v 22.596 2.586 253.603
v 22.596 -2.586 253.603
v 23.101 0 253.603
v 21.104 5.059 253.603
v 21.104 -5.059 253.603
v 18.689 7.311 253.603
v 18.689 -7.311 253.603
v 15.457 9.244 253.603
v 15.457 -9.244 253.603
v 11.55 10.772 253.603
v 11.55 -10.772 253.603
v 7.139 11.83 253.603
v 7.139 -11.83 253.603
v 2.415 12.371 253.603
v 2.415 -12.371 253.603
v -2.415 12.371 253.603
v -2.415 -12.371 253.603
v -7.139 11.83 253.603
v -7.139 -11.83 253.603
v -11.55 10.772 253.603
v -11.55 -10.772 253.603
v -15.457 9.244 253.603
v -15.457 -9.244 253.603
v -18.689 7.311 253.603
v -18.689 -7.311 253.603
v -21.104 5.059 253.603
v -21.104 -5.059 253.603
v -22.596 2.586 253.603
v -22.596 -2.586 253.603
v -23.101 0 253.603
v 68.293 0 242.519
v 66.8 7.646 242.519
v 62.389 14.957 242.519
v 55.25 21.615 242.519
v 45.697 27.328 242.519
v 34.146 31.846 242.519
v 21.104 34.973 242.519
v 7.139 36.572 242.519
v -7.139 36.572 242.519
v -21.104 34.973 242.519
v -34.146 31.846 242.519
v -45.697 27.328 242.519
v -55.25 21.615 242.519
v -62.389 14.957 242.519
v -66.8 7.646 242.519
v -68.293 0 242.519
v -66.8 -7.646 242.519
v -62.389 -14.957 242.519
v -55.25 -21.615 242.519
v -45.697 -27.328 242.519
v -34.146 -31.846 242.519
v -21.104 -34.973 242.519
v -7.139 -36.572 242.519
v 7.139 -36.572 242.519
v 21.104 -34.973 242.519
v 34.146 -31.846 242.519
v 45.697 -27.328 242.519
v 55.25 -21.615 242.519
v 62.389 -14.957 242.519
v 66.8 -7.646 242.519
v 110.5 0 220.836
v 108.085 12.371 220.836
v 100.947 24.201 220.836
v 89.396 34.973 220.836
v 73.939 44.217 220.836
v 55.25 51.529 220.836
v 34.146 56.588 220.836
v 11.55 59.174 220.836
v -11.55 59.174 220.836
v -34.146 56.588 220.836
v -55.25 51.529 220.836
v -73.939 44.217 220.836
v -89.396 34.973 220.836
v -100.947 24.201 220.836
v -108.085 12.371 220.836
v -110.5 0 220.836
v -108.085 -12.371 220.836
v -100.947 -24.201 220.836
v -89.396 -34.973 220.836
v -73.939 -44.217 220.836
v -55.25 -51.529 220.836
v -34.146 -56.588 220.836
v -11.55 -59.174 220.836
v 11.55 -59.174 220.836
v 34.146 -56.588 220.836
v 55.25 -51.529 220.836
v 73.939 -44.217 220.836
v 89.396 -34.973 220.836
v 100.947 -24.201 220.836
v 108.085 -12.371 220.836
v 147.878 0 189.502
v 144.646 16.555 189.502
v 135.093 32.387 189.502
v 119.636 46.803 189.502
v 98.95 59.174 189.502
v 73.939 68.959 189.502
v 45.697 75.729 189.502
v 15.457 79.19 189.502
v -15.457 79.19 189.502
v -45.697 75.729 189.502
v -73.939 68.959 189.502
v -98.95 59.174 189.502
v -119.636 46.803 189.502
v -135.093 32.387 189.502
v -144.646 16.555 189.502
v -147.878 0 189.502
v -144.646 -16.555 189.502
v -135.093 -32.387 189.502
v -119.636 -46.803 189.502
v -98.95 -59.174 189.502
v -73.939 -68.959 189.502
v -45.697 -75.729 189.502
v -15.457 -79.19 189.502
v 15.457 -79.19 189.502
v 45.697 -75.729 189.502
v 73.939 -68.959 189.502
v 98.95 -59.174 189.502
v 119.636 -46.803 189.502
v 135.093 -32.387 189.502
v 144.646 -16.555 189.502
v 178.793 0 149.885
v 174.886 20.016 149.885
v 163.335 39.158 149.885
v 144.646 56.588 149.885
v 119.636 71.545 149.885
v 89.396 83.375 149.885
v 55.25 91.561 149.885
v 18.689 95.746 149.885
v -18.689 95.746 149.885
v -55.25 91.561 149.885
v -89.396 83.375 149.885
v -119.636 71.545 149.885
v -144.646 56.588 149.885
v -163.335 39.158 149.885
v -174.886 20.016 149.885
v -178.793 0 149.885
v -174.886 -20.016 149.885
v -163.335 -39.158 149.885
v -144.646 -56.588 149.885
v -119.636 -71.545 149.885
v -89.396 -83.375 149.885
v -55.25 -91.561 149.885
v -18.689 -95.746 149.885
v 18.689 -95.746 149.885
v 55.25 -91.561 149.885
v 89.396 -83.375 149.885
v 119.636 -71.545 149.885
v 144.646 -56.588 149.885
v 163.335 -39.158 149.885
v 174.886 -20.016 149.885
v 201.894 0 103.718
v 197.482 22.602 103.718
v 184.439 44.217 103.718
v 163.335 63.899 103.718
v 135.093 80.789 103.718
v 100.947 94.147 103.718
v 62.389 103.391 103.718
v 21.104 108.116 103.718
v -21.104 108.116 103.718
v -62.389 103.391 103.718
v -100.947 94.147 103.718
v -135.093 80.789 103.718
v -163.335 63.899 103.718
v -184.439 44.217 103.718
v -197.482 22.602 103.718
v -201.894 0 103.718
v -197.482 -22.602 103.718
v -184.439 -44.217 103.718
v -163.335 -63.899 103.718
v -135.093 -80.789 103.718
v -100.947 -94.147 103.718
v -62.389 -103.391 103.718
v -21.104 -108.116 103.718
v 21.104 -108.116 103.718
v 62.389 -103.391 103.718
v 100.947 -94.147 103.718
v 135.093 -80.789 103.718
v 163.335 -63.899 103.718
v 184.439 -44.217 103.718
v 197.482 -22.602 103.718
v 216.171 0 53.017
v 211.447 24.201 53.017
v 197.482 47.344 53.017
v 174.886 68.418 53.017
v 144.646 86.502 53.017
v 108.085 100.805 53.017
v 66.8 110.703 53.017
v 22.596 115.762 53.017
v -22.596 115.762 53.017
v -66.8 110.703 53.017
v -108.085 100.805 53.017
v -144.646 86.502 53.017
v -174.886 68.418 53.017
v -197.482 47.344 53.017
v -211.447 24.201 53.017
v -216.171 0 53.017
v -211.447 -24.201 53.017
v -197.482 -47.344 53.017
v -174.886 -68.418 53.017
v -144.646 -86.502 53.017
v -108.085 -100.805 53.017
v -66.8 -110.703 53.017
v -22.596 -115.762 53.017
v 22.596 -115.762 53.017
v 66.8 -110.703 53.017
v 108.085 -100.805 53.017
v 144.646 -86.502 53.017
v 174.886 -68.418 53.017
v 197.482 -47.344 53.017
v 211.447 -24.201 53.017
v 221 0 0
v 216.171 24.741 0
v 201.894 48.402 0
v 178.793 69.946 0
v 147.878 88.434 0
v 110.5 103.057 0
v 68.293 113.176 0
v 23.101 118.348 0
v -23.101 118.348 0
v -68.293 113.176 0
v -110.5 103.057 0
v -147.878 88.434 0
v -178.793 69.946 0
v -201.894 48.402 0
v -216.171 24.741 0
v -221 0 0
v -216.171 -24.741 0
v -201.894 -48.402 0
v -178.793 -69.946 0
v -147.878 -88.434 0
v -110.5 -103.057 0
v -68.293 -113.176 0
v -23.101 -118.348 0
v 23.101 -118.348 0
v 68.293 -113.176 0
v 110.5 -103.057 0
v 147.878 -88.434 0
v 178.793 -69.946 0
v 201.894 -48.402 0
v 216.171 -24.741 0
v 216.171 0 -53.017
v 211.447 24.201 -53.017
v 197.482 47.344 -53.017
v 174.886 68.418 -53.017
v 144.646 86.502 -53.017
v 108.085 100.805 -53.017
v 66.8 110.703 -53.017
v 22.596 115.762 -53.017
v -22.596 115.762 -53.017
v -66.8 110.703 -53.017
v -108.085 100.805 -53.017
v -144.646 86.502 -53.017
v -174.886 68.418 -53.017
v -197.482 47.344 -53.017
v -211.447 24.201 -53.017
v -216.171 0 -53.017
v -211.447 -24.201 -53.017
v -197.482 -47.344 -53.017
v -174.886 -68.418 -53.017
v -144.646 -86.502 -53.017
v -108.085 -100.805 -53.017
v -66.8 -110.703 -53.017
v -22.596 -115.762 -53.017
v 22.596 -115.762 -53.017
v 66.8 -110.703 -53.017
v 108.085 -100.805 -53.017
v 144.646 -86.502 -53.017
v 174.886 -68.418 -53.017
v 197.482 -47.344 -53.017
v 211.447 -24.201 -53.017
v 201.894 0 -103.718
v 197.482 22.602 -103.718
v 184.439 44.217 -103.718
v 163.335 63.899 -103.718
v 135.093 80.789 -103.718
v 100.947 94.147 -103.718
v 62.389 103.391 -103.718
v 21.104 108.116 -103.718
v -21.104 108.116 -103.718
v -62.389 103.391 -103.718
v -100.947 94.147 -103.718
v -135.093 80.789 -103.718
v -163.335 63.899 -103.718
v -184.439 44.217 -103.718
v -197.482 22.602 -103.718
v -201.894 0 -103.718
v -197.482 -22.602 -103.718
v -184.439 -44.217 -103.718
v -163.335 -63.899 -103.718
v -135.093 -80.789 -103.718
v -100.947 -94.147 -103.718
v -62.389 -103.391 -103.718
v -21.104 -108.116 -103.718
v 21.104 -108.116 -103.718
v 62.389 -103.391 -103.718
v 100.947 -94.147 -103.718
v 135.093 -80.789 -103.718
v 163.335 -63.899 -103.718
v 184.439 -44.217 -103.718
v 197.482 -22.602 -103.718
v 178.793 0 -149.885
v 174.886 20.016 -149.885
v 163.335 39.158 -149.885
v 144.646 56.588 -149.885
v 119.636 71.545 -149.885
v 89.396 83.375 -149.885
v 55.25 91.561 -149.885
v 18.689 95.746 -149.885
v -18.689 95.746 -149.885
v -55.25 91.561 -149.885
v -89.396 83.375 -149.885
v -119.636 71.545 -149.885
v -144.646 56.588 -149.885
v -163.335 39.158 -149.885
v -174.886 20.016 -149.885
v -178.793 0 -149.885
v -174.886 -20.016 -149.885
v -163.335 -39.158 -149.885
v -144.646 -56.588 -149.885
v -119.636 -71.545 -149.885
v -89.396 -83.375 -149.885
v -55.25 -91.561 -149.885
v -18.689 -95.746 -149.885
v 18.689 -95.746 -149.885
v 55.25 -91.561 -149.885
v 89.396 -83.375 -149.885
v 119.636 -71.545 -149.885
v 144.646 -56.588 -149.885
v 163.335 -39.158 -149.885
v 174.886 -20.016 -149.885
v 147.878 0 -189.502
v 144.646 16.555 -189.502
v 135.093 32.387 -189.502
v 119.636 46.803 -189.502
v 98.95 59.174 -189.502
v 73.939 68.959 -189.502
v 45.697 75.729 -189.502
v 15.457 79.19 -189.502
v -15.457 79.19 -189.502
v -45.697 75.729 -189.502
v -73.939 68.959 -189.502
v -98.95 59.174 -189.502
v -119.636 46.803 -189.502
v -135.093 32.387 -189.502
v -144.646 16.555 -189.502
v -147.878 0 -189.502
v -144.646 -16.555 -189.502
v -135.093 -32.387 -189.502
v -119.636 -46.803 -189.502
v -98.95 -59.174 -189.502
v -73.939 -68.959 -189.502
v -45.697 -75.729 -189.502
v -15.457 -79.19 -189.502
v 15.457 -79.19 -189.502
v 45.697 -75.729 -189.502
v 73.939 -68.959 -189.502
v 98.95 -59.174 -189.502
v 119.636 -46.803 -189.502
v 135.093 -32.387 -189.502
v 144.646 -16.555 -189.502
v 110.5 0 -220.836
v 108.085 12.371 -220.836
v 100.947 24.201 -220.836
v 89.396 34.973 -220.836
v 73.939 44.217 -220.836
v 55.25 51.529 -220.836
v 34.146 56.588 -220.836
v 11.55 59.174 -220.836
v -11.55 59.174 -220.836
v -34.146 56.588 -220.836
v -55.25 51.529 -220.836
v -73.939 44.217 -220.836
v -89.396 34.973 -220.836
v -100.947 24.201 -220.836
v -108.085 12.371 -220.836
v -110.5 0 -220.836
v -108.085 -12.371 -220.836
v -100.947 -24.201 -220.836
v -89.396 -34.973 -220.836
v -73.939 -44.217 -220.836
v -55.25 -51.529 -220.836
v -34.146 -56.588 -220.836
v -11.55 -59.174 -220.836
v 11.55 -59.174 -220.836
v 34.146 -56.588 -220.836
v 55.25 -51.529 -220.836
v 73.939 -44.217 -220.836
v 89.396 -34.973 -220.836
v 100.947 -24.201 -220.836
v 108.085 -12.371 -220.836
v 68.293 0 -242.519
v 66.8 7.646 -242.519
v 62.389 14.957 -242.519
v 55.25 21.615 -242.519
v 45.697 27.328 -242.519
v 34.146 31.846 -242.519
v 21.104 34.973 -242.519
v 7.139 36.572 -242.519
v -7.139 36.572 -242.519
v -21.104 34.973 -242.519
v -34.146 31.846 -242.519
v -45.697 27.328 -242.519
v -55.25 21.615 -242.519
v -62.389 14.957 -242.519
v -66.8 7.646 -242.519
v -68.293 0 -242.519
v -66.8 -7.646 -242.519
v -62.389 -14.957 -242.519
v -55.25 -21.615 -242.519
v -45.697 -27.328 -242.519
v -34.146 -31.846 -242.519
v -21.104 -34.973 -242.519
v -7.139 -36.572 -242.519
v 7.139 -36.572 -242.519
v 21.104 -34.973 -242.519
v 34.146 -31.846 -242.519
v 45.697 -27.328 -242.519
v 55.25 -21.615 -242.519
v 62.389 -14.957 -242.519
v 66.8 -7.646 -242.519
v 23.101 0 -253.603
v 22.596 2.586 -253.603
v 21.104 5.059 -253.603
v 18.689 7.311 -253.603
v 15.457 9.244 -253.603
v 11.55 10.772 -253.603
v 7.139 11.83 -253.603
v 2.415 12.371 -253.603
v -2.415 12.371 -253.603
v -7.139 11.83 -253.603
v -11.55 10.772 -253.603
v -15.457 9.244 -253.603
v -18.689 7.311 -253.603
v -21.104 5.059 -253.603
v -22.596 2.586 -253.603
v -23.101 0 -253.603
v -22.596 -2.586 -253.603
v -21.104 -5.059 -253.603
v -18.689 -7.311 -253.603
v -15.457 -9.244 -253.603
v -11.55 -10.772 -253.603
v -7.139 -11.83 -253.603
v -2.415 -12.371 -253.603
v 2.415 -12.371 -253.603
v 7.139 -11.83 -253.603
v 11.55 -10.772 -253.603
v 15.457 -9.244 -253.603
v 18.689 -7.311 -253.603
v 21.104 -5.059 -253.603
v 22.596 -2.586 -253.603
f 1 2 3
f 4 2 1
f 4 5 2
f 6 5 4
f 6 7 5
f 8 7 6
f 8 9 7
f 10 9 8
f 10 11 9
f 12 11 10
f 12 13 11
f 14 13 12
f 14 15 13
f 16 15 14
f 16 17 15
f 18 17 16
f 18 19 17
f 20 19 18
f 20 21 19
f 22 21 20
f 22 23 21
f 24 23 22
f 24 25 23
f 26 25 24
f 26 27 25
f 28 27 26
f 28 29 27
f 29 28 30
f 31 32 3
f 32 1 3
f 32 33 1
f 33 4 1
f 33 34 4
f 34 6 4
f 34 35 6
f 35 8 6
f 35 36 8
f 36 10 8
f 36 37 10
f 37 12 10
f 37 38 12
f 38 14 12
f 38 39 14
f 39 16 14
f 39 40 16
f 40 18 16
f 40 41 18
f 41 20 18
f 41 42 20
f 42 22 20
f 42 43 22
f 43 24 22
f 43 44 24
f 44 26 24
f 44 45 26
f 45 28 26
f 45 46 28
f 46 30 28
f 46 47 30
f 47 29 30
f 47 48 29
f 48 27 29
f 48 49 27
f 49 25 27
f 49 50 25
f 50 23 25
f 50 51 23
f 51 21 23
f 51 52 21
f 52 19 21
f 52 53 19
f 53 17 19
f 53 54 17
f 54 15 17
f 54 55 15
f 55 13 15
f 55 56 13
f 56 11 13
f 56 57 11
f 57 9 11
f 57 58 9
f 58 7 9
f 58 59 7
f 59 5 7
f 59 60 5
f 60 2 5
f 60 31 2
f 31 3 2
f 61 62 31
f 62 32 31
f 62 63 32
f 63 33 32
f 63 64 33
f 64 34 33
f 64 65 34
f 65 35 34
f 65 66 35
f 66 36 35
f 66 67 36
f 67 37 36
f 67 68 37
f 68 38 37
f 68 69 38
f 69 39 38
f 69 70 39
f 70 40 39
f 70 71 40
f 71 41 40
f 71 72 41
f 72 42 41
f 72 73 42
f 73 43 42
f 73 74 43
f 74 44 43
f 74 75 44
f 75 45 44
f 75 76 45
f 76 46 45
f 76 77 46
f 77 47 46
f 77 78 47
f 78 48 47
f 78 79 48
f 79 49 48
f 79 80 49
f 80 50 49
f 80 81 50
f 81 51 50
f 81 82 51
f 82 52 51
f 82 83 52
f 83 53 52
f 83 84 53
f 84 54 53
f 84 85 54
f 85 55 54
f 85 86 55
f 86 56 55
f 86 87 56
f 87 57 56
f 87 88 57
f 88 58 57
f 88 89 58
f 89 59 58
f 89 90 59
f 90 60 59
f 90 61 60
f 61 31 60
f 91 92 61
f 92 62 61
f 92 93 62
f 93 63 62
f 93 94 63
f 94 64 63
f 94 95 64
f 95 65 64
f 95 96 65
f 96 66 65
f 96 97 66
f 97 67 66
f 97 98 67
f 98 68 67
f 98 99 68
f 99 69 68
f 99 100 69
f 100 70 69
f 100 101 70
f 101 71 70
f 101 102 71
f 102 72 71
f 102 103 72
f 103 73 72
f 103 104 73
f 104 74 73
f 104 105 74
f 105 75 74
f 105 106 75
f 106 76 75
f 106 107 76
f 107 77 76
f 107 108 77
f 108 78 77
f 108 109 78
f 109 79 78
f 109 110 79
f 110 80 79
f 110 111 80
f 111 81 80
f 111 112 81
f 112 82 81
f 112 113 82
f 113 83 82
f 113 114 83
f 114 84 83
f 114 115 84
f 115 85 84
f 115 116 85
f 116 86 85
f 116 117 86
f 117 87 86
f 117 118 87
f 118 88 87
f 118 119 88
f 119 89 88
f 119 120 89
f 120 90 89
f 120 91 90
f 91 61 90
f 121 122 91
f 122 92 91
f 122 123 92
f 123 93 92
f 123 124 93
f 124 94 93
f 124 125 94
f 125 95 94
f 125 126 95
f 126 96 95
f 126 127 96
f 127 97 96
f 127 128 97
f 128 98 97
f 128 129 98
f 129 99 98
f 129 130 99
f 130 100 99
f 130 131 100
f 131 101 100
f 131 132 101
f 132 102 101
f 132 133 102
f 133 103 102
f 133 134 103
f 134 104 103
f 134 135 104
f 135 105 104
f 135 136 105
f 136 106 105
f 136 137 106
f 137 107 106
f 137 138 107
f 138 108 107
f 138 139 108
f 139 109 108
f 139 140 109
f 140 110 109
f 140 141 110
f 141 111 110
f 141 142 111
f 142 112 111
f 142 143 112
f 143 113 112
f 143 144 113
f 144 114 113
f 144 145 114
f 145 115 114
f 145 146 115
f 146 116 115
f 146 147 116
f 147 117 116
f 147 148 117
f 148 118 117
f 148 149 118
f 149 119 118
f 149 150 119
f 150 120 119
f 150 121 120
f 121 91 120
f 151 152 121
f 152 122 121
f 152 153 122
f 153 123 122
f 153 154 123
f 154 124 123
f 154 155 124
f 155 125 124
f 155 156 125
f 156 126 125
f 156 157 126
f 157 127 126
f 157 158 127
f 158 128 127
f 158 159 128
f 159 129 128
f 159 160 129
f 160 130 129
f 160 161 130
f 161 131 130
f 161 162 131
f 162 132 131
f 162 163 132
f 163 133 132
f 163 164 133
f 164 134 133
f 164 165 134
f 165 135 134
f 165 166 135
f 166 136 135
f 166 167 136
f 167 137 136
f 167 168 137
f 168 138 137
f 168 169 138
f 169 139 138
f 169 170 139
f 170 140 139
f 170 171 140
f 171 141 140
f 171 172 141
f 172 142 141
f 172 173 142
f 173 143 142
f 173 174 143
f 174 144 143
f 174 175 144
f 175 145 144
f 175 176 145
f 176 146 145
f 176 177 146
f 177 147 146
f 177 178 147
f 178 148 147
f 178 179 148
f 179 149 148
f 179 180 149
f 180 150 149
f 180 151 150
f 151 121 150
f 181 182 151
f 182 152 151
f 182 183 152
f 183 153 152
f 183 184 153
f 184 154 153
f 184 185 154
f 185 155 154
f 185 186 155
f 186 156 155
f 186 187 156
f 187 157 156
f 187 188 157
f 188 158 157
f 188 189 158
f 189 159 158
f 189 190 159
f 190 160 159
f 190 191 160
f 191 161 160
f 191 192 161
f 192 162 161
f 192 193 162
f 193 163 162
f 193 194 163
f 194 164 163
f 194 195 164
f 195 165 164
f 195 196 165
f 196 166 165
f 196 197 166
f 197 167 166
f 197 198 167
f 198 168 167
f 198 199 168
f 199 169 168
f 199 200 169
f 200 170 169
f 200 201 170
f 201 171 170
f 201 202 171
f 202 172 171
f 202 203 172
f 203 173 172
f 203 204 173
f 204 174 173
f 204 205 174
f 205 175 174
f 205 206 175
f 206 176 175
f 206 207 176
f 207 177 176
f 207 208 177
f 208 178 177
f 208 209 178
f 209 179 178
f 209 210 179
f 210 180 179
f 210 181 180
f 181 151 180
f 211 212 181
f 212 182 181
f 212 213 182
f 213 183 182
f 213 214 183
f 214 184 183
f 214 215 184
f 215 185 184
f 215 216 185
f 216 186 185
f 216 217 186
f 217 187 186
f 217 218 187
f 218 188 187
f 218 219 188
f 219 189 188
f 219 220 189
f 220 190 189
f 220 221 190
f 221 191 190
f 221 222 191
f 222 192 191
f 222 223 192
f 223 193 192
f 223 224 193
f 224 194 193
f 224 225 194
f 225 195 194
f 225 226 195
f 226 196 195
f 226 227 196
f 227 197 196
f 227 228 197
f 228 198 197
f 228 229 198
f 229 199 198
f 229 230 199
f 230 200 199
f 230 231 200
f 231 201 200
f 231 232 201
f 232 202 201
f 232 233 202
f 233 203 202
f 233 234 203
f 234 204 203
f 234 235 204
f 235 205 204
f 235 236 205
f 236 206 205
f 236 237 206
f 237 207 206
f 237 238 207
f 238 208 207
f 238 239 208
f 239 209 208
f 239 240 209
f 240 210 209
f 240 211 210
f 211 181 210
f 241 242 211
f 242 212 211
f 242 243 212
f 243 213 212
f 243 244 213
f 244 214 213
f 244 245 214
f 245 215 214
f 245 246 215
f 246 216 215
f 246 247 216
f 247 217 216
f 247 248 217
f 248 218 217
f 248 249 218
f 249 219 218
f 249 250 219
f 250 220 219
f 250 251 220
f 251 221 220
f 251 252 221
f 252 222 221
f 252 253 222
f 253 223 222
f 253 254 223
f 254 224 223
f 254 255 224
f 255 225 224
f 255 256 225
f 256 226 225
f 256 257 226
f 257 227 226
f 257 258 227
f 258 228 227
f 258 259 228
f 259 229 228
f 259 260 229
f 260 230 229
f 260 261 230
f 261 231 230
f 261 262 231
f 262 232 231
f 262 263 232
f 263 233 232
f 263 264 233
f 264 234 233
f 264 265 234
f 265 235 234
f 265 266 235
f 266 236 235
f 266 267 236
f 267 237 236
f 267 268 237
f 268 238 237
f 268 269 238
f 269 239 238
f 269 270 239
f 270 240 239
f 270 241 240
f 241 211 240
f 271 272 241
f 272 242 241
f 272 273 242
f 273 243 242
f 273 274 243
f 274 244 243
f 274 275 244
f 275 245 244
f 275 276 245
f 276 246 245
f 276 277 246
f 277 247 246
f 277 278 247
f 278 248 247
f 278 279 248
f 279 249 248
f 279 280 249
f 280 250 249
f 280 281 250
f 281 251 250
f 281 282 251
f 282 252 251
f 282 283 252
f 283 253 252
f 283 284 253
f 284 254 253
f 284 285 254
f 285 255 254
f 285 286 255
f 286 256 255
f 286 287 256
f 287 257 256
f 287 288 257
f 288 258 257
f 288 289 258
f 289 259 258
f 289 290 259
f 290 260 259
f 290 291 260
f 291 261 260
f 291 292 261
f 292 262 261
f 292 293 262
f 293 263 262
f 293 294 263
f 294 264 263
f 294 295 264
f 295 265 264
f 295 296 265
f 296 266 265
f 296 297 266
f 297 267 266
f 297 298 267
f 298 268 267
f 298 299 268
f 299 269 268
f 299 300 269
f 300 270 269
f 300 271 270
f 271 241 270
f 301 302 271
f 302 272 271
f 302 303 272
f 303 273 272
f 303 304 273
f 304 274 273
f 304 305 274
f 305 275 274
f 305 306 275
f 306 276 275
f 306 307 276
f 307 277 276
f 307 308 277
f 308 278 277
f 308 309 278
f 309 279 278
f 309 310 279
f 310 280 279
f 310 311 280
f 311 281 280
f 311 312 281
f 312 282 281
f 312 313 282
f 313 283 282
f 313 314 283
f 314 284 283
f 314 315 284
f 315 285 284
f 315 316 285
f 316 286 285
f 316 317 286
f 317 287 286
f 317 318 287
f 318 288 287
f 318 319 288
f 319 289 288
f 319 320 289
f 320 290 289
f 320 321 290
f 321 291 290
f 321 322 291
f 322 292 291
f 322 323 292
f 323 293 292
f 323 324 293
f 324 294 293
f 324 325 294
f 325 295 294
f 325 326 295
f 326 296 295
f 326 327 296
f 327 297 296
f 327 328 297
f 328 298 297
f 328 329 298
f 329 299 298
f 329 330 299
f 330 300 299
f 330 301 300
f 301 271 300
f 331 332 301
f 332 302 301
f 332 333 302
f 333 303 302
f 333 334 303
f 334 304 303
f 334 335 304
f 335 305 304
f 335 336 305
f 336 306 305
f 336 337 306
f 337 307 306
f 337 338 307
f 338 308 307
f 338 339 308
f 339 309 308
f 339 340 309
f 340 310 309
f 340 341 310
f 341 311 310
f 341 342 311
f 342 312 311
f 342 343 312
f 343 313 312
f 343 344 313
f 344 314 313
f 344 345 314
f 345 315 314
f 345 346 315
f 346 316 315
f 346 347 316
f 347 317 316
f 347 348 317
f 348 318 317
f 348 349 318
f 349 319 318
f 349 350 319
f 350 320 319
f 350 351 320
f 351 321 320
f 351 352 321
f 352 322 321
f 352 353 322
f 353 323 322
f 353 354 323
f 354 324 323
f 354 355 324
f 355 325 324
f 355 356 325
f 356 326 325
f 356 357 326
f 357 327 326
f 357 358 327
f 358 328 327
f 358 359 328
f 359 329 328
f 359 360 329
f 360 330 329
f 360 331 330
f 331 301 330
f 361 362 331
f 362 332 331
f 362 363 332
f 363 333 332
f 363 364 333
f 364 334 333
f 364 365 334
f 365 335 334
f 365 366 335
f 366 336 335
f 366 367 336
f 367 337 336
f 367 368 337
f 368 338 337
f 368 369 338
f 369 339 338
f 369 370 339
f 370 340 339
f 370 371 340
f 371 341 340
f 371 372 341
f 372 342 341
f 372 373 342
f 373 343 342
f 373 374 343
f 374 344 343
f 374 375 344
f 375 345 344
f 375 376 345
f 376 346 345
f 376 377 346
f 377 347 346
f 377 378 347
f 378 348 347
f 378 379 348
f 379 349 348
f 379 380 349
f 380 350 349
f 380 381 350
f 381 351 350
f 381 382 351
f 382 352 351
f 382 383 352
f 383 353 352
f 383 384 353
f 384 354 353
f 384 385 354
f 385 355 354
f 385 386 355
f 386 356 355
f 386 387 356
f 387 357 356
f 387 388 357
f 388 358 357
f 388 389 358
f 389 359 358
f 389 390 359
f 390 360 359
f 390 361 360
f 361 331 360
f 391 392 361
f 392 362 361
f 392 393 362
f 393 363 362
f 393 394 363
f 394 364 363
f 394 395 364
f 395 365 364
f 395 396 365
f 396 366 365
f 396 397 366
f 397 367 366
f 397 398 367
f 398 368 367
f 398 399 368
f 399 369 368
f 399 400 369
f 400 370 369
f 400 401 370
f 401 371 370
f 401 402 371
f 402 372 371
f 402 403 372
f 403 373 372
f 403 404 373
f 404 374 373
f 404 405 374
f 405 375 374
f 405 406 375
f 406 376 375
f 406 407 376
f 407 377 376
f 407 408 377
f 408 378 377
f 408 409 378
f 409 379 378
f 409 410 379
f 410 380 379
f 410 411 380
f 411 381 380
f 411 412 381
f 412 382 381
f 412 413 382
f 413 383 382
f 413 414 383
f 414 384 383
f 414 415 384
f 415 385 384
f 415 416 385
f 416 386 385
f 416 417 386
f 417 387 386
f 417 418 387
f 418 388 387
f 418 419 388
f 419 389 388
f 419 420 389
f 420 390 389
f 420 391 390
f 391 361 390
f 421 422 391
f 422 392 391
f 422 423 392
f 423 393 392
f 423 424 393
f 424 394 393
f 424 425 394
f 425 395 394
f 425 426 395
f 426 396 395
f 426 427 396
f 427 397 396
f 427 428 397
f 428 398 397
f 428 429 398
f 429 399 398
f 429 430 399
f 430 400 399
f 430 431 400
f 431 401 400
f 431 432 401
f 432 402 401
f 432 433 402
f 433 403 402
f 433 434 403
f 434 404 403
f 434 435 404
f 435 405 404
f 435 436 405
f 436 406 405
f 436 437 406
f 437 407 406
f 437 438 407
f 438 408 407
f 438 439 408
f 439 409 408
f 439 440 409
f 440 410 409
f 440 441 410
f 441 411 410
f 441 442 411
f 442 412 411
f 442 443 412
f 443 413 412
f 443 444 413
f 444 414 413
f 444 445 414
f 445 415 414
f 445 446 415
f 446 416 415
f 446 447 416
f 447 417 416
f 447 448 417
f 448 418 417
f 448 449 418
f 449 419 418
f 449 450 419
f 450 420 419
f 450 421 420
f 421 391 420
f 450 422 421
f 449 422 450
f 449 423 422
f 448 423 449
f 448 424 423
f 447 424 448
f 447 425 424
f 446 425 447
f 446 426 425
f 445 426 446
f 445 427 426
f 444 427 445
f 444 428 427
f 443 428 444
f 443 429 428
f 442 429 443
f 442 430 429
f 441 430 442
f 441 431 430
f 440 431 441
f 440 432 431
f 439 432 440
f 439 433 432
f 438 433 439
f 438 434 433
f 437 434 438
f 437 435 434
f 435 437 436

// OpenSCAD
// Generated by SolidPython 1.0.1 on 2020-07-29 00:46:50


scale(v = [13, 7, 15]) {
	sphere(r = 17);
}
/***********************************************
*********      SolidPython code:      **********
************************************************
 
# import packages: SolidPython
from solid import *
from solid.utils import *
from itertools import chain, combinations, permutations


class Resize:

    def __init__(self, scad_file):
        self.scad_file = scad_file
        #self.scad_file = import_scad(scad_file)
        # cone/cylinder param:
        self.r1 = 0
        self.r2 = 0
        self.h = 0
        # rectangular prism param:
        self.w = 0
        self.l = 0
        # ellipse param:
        self.r = 0

    # import OpenScad code (file name corresponds to shape)


    # classify shape + parameters
    def assign(self, param1, param2, param3):
        if self.scad_file == 'cone.scad':
            self.r1 = param1
            self.r2 = param2
            self.h = param3
        elif self.scad_file == 'cylinder.scad':
            self.r1 = param1
            self.r2 = param2
            self.h = param3
        elif self.scad_file == 'rectangularPrism.scad':
            self.h = param1
            self.l = param2
            self.w = param3
        else:
            self.r = param1
            self.h = param2

    # resize parameters
    def iterate(self):
        x = range(3, 20, 2)
        i = 1
        if self.scad_file == 'cone.scad':
            tempList = list(permutations(x, 2))
            for temp in tempList:
                param1 = temp[0]
                param2 = temp[1]
                filepath = 'produced_scad_files/' + 'cone' + str(param1) + '_' + str(param2) + '_' + '.scad'
                scad_render_to_file(cylinder(h=param1, r1=param2, r2=0), filepath)

        elif self.scad_file == 'cylinder.scad':
            tempList = list(permutations(x, 3))
            for temp in tempList:
                param1 = temp[0]
                param2 = temp[1]
                filepath = 'produced_scad_files/' + 'cylinder' + str(param1) + '_' + str(param2) + '_' + '.scad'
                scad_render_to_file(cylinder(h=param1, r1=param2, r2=param2), filepath)

        elif self.scad_file == 'rectangularPrism.scad':
            tempList = list(permutations(x, 3))
            for temp in tempList:
                param1 = temp[0]
                param2 = temp[1]
                param3 = temp[2]
                filepath = 'produced_scad_files/' + 'rectangularPrism' + str(param1) + '_' + str(param2) + '_' + str(
                    param3) + '.scad'
                scad_render_to_file(cube(size=(param1, param2, param3)), filepath)

        elif self.scad_file == 'ellipse.scad':
            tempList = list(permutations(x, 4))
            for temp in tempList:
                param1 = temp[0]
                param2 = temp[1]
                param3 = temp[2]
                param4 = temp[3]
                filepath = 'produced_scad_files/' + 'ellipse' + str(param1) + '_' + str(param2) + '_' + str(param3) + '_' + str(param4) + '.scad'
                scad_render_to_file(scale([param1, param2, param3])(sphere(r=param4)), filepath)

    def render_to_scadfile(self):
        scad_render_to_file(scad, 'example.scad') 
 
************************************************/
